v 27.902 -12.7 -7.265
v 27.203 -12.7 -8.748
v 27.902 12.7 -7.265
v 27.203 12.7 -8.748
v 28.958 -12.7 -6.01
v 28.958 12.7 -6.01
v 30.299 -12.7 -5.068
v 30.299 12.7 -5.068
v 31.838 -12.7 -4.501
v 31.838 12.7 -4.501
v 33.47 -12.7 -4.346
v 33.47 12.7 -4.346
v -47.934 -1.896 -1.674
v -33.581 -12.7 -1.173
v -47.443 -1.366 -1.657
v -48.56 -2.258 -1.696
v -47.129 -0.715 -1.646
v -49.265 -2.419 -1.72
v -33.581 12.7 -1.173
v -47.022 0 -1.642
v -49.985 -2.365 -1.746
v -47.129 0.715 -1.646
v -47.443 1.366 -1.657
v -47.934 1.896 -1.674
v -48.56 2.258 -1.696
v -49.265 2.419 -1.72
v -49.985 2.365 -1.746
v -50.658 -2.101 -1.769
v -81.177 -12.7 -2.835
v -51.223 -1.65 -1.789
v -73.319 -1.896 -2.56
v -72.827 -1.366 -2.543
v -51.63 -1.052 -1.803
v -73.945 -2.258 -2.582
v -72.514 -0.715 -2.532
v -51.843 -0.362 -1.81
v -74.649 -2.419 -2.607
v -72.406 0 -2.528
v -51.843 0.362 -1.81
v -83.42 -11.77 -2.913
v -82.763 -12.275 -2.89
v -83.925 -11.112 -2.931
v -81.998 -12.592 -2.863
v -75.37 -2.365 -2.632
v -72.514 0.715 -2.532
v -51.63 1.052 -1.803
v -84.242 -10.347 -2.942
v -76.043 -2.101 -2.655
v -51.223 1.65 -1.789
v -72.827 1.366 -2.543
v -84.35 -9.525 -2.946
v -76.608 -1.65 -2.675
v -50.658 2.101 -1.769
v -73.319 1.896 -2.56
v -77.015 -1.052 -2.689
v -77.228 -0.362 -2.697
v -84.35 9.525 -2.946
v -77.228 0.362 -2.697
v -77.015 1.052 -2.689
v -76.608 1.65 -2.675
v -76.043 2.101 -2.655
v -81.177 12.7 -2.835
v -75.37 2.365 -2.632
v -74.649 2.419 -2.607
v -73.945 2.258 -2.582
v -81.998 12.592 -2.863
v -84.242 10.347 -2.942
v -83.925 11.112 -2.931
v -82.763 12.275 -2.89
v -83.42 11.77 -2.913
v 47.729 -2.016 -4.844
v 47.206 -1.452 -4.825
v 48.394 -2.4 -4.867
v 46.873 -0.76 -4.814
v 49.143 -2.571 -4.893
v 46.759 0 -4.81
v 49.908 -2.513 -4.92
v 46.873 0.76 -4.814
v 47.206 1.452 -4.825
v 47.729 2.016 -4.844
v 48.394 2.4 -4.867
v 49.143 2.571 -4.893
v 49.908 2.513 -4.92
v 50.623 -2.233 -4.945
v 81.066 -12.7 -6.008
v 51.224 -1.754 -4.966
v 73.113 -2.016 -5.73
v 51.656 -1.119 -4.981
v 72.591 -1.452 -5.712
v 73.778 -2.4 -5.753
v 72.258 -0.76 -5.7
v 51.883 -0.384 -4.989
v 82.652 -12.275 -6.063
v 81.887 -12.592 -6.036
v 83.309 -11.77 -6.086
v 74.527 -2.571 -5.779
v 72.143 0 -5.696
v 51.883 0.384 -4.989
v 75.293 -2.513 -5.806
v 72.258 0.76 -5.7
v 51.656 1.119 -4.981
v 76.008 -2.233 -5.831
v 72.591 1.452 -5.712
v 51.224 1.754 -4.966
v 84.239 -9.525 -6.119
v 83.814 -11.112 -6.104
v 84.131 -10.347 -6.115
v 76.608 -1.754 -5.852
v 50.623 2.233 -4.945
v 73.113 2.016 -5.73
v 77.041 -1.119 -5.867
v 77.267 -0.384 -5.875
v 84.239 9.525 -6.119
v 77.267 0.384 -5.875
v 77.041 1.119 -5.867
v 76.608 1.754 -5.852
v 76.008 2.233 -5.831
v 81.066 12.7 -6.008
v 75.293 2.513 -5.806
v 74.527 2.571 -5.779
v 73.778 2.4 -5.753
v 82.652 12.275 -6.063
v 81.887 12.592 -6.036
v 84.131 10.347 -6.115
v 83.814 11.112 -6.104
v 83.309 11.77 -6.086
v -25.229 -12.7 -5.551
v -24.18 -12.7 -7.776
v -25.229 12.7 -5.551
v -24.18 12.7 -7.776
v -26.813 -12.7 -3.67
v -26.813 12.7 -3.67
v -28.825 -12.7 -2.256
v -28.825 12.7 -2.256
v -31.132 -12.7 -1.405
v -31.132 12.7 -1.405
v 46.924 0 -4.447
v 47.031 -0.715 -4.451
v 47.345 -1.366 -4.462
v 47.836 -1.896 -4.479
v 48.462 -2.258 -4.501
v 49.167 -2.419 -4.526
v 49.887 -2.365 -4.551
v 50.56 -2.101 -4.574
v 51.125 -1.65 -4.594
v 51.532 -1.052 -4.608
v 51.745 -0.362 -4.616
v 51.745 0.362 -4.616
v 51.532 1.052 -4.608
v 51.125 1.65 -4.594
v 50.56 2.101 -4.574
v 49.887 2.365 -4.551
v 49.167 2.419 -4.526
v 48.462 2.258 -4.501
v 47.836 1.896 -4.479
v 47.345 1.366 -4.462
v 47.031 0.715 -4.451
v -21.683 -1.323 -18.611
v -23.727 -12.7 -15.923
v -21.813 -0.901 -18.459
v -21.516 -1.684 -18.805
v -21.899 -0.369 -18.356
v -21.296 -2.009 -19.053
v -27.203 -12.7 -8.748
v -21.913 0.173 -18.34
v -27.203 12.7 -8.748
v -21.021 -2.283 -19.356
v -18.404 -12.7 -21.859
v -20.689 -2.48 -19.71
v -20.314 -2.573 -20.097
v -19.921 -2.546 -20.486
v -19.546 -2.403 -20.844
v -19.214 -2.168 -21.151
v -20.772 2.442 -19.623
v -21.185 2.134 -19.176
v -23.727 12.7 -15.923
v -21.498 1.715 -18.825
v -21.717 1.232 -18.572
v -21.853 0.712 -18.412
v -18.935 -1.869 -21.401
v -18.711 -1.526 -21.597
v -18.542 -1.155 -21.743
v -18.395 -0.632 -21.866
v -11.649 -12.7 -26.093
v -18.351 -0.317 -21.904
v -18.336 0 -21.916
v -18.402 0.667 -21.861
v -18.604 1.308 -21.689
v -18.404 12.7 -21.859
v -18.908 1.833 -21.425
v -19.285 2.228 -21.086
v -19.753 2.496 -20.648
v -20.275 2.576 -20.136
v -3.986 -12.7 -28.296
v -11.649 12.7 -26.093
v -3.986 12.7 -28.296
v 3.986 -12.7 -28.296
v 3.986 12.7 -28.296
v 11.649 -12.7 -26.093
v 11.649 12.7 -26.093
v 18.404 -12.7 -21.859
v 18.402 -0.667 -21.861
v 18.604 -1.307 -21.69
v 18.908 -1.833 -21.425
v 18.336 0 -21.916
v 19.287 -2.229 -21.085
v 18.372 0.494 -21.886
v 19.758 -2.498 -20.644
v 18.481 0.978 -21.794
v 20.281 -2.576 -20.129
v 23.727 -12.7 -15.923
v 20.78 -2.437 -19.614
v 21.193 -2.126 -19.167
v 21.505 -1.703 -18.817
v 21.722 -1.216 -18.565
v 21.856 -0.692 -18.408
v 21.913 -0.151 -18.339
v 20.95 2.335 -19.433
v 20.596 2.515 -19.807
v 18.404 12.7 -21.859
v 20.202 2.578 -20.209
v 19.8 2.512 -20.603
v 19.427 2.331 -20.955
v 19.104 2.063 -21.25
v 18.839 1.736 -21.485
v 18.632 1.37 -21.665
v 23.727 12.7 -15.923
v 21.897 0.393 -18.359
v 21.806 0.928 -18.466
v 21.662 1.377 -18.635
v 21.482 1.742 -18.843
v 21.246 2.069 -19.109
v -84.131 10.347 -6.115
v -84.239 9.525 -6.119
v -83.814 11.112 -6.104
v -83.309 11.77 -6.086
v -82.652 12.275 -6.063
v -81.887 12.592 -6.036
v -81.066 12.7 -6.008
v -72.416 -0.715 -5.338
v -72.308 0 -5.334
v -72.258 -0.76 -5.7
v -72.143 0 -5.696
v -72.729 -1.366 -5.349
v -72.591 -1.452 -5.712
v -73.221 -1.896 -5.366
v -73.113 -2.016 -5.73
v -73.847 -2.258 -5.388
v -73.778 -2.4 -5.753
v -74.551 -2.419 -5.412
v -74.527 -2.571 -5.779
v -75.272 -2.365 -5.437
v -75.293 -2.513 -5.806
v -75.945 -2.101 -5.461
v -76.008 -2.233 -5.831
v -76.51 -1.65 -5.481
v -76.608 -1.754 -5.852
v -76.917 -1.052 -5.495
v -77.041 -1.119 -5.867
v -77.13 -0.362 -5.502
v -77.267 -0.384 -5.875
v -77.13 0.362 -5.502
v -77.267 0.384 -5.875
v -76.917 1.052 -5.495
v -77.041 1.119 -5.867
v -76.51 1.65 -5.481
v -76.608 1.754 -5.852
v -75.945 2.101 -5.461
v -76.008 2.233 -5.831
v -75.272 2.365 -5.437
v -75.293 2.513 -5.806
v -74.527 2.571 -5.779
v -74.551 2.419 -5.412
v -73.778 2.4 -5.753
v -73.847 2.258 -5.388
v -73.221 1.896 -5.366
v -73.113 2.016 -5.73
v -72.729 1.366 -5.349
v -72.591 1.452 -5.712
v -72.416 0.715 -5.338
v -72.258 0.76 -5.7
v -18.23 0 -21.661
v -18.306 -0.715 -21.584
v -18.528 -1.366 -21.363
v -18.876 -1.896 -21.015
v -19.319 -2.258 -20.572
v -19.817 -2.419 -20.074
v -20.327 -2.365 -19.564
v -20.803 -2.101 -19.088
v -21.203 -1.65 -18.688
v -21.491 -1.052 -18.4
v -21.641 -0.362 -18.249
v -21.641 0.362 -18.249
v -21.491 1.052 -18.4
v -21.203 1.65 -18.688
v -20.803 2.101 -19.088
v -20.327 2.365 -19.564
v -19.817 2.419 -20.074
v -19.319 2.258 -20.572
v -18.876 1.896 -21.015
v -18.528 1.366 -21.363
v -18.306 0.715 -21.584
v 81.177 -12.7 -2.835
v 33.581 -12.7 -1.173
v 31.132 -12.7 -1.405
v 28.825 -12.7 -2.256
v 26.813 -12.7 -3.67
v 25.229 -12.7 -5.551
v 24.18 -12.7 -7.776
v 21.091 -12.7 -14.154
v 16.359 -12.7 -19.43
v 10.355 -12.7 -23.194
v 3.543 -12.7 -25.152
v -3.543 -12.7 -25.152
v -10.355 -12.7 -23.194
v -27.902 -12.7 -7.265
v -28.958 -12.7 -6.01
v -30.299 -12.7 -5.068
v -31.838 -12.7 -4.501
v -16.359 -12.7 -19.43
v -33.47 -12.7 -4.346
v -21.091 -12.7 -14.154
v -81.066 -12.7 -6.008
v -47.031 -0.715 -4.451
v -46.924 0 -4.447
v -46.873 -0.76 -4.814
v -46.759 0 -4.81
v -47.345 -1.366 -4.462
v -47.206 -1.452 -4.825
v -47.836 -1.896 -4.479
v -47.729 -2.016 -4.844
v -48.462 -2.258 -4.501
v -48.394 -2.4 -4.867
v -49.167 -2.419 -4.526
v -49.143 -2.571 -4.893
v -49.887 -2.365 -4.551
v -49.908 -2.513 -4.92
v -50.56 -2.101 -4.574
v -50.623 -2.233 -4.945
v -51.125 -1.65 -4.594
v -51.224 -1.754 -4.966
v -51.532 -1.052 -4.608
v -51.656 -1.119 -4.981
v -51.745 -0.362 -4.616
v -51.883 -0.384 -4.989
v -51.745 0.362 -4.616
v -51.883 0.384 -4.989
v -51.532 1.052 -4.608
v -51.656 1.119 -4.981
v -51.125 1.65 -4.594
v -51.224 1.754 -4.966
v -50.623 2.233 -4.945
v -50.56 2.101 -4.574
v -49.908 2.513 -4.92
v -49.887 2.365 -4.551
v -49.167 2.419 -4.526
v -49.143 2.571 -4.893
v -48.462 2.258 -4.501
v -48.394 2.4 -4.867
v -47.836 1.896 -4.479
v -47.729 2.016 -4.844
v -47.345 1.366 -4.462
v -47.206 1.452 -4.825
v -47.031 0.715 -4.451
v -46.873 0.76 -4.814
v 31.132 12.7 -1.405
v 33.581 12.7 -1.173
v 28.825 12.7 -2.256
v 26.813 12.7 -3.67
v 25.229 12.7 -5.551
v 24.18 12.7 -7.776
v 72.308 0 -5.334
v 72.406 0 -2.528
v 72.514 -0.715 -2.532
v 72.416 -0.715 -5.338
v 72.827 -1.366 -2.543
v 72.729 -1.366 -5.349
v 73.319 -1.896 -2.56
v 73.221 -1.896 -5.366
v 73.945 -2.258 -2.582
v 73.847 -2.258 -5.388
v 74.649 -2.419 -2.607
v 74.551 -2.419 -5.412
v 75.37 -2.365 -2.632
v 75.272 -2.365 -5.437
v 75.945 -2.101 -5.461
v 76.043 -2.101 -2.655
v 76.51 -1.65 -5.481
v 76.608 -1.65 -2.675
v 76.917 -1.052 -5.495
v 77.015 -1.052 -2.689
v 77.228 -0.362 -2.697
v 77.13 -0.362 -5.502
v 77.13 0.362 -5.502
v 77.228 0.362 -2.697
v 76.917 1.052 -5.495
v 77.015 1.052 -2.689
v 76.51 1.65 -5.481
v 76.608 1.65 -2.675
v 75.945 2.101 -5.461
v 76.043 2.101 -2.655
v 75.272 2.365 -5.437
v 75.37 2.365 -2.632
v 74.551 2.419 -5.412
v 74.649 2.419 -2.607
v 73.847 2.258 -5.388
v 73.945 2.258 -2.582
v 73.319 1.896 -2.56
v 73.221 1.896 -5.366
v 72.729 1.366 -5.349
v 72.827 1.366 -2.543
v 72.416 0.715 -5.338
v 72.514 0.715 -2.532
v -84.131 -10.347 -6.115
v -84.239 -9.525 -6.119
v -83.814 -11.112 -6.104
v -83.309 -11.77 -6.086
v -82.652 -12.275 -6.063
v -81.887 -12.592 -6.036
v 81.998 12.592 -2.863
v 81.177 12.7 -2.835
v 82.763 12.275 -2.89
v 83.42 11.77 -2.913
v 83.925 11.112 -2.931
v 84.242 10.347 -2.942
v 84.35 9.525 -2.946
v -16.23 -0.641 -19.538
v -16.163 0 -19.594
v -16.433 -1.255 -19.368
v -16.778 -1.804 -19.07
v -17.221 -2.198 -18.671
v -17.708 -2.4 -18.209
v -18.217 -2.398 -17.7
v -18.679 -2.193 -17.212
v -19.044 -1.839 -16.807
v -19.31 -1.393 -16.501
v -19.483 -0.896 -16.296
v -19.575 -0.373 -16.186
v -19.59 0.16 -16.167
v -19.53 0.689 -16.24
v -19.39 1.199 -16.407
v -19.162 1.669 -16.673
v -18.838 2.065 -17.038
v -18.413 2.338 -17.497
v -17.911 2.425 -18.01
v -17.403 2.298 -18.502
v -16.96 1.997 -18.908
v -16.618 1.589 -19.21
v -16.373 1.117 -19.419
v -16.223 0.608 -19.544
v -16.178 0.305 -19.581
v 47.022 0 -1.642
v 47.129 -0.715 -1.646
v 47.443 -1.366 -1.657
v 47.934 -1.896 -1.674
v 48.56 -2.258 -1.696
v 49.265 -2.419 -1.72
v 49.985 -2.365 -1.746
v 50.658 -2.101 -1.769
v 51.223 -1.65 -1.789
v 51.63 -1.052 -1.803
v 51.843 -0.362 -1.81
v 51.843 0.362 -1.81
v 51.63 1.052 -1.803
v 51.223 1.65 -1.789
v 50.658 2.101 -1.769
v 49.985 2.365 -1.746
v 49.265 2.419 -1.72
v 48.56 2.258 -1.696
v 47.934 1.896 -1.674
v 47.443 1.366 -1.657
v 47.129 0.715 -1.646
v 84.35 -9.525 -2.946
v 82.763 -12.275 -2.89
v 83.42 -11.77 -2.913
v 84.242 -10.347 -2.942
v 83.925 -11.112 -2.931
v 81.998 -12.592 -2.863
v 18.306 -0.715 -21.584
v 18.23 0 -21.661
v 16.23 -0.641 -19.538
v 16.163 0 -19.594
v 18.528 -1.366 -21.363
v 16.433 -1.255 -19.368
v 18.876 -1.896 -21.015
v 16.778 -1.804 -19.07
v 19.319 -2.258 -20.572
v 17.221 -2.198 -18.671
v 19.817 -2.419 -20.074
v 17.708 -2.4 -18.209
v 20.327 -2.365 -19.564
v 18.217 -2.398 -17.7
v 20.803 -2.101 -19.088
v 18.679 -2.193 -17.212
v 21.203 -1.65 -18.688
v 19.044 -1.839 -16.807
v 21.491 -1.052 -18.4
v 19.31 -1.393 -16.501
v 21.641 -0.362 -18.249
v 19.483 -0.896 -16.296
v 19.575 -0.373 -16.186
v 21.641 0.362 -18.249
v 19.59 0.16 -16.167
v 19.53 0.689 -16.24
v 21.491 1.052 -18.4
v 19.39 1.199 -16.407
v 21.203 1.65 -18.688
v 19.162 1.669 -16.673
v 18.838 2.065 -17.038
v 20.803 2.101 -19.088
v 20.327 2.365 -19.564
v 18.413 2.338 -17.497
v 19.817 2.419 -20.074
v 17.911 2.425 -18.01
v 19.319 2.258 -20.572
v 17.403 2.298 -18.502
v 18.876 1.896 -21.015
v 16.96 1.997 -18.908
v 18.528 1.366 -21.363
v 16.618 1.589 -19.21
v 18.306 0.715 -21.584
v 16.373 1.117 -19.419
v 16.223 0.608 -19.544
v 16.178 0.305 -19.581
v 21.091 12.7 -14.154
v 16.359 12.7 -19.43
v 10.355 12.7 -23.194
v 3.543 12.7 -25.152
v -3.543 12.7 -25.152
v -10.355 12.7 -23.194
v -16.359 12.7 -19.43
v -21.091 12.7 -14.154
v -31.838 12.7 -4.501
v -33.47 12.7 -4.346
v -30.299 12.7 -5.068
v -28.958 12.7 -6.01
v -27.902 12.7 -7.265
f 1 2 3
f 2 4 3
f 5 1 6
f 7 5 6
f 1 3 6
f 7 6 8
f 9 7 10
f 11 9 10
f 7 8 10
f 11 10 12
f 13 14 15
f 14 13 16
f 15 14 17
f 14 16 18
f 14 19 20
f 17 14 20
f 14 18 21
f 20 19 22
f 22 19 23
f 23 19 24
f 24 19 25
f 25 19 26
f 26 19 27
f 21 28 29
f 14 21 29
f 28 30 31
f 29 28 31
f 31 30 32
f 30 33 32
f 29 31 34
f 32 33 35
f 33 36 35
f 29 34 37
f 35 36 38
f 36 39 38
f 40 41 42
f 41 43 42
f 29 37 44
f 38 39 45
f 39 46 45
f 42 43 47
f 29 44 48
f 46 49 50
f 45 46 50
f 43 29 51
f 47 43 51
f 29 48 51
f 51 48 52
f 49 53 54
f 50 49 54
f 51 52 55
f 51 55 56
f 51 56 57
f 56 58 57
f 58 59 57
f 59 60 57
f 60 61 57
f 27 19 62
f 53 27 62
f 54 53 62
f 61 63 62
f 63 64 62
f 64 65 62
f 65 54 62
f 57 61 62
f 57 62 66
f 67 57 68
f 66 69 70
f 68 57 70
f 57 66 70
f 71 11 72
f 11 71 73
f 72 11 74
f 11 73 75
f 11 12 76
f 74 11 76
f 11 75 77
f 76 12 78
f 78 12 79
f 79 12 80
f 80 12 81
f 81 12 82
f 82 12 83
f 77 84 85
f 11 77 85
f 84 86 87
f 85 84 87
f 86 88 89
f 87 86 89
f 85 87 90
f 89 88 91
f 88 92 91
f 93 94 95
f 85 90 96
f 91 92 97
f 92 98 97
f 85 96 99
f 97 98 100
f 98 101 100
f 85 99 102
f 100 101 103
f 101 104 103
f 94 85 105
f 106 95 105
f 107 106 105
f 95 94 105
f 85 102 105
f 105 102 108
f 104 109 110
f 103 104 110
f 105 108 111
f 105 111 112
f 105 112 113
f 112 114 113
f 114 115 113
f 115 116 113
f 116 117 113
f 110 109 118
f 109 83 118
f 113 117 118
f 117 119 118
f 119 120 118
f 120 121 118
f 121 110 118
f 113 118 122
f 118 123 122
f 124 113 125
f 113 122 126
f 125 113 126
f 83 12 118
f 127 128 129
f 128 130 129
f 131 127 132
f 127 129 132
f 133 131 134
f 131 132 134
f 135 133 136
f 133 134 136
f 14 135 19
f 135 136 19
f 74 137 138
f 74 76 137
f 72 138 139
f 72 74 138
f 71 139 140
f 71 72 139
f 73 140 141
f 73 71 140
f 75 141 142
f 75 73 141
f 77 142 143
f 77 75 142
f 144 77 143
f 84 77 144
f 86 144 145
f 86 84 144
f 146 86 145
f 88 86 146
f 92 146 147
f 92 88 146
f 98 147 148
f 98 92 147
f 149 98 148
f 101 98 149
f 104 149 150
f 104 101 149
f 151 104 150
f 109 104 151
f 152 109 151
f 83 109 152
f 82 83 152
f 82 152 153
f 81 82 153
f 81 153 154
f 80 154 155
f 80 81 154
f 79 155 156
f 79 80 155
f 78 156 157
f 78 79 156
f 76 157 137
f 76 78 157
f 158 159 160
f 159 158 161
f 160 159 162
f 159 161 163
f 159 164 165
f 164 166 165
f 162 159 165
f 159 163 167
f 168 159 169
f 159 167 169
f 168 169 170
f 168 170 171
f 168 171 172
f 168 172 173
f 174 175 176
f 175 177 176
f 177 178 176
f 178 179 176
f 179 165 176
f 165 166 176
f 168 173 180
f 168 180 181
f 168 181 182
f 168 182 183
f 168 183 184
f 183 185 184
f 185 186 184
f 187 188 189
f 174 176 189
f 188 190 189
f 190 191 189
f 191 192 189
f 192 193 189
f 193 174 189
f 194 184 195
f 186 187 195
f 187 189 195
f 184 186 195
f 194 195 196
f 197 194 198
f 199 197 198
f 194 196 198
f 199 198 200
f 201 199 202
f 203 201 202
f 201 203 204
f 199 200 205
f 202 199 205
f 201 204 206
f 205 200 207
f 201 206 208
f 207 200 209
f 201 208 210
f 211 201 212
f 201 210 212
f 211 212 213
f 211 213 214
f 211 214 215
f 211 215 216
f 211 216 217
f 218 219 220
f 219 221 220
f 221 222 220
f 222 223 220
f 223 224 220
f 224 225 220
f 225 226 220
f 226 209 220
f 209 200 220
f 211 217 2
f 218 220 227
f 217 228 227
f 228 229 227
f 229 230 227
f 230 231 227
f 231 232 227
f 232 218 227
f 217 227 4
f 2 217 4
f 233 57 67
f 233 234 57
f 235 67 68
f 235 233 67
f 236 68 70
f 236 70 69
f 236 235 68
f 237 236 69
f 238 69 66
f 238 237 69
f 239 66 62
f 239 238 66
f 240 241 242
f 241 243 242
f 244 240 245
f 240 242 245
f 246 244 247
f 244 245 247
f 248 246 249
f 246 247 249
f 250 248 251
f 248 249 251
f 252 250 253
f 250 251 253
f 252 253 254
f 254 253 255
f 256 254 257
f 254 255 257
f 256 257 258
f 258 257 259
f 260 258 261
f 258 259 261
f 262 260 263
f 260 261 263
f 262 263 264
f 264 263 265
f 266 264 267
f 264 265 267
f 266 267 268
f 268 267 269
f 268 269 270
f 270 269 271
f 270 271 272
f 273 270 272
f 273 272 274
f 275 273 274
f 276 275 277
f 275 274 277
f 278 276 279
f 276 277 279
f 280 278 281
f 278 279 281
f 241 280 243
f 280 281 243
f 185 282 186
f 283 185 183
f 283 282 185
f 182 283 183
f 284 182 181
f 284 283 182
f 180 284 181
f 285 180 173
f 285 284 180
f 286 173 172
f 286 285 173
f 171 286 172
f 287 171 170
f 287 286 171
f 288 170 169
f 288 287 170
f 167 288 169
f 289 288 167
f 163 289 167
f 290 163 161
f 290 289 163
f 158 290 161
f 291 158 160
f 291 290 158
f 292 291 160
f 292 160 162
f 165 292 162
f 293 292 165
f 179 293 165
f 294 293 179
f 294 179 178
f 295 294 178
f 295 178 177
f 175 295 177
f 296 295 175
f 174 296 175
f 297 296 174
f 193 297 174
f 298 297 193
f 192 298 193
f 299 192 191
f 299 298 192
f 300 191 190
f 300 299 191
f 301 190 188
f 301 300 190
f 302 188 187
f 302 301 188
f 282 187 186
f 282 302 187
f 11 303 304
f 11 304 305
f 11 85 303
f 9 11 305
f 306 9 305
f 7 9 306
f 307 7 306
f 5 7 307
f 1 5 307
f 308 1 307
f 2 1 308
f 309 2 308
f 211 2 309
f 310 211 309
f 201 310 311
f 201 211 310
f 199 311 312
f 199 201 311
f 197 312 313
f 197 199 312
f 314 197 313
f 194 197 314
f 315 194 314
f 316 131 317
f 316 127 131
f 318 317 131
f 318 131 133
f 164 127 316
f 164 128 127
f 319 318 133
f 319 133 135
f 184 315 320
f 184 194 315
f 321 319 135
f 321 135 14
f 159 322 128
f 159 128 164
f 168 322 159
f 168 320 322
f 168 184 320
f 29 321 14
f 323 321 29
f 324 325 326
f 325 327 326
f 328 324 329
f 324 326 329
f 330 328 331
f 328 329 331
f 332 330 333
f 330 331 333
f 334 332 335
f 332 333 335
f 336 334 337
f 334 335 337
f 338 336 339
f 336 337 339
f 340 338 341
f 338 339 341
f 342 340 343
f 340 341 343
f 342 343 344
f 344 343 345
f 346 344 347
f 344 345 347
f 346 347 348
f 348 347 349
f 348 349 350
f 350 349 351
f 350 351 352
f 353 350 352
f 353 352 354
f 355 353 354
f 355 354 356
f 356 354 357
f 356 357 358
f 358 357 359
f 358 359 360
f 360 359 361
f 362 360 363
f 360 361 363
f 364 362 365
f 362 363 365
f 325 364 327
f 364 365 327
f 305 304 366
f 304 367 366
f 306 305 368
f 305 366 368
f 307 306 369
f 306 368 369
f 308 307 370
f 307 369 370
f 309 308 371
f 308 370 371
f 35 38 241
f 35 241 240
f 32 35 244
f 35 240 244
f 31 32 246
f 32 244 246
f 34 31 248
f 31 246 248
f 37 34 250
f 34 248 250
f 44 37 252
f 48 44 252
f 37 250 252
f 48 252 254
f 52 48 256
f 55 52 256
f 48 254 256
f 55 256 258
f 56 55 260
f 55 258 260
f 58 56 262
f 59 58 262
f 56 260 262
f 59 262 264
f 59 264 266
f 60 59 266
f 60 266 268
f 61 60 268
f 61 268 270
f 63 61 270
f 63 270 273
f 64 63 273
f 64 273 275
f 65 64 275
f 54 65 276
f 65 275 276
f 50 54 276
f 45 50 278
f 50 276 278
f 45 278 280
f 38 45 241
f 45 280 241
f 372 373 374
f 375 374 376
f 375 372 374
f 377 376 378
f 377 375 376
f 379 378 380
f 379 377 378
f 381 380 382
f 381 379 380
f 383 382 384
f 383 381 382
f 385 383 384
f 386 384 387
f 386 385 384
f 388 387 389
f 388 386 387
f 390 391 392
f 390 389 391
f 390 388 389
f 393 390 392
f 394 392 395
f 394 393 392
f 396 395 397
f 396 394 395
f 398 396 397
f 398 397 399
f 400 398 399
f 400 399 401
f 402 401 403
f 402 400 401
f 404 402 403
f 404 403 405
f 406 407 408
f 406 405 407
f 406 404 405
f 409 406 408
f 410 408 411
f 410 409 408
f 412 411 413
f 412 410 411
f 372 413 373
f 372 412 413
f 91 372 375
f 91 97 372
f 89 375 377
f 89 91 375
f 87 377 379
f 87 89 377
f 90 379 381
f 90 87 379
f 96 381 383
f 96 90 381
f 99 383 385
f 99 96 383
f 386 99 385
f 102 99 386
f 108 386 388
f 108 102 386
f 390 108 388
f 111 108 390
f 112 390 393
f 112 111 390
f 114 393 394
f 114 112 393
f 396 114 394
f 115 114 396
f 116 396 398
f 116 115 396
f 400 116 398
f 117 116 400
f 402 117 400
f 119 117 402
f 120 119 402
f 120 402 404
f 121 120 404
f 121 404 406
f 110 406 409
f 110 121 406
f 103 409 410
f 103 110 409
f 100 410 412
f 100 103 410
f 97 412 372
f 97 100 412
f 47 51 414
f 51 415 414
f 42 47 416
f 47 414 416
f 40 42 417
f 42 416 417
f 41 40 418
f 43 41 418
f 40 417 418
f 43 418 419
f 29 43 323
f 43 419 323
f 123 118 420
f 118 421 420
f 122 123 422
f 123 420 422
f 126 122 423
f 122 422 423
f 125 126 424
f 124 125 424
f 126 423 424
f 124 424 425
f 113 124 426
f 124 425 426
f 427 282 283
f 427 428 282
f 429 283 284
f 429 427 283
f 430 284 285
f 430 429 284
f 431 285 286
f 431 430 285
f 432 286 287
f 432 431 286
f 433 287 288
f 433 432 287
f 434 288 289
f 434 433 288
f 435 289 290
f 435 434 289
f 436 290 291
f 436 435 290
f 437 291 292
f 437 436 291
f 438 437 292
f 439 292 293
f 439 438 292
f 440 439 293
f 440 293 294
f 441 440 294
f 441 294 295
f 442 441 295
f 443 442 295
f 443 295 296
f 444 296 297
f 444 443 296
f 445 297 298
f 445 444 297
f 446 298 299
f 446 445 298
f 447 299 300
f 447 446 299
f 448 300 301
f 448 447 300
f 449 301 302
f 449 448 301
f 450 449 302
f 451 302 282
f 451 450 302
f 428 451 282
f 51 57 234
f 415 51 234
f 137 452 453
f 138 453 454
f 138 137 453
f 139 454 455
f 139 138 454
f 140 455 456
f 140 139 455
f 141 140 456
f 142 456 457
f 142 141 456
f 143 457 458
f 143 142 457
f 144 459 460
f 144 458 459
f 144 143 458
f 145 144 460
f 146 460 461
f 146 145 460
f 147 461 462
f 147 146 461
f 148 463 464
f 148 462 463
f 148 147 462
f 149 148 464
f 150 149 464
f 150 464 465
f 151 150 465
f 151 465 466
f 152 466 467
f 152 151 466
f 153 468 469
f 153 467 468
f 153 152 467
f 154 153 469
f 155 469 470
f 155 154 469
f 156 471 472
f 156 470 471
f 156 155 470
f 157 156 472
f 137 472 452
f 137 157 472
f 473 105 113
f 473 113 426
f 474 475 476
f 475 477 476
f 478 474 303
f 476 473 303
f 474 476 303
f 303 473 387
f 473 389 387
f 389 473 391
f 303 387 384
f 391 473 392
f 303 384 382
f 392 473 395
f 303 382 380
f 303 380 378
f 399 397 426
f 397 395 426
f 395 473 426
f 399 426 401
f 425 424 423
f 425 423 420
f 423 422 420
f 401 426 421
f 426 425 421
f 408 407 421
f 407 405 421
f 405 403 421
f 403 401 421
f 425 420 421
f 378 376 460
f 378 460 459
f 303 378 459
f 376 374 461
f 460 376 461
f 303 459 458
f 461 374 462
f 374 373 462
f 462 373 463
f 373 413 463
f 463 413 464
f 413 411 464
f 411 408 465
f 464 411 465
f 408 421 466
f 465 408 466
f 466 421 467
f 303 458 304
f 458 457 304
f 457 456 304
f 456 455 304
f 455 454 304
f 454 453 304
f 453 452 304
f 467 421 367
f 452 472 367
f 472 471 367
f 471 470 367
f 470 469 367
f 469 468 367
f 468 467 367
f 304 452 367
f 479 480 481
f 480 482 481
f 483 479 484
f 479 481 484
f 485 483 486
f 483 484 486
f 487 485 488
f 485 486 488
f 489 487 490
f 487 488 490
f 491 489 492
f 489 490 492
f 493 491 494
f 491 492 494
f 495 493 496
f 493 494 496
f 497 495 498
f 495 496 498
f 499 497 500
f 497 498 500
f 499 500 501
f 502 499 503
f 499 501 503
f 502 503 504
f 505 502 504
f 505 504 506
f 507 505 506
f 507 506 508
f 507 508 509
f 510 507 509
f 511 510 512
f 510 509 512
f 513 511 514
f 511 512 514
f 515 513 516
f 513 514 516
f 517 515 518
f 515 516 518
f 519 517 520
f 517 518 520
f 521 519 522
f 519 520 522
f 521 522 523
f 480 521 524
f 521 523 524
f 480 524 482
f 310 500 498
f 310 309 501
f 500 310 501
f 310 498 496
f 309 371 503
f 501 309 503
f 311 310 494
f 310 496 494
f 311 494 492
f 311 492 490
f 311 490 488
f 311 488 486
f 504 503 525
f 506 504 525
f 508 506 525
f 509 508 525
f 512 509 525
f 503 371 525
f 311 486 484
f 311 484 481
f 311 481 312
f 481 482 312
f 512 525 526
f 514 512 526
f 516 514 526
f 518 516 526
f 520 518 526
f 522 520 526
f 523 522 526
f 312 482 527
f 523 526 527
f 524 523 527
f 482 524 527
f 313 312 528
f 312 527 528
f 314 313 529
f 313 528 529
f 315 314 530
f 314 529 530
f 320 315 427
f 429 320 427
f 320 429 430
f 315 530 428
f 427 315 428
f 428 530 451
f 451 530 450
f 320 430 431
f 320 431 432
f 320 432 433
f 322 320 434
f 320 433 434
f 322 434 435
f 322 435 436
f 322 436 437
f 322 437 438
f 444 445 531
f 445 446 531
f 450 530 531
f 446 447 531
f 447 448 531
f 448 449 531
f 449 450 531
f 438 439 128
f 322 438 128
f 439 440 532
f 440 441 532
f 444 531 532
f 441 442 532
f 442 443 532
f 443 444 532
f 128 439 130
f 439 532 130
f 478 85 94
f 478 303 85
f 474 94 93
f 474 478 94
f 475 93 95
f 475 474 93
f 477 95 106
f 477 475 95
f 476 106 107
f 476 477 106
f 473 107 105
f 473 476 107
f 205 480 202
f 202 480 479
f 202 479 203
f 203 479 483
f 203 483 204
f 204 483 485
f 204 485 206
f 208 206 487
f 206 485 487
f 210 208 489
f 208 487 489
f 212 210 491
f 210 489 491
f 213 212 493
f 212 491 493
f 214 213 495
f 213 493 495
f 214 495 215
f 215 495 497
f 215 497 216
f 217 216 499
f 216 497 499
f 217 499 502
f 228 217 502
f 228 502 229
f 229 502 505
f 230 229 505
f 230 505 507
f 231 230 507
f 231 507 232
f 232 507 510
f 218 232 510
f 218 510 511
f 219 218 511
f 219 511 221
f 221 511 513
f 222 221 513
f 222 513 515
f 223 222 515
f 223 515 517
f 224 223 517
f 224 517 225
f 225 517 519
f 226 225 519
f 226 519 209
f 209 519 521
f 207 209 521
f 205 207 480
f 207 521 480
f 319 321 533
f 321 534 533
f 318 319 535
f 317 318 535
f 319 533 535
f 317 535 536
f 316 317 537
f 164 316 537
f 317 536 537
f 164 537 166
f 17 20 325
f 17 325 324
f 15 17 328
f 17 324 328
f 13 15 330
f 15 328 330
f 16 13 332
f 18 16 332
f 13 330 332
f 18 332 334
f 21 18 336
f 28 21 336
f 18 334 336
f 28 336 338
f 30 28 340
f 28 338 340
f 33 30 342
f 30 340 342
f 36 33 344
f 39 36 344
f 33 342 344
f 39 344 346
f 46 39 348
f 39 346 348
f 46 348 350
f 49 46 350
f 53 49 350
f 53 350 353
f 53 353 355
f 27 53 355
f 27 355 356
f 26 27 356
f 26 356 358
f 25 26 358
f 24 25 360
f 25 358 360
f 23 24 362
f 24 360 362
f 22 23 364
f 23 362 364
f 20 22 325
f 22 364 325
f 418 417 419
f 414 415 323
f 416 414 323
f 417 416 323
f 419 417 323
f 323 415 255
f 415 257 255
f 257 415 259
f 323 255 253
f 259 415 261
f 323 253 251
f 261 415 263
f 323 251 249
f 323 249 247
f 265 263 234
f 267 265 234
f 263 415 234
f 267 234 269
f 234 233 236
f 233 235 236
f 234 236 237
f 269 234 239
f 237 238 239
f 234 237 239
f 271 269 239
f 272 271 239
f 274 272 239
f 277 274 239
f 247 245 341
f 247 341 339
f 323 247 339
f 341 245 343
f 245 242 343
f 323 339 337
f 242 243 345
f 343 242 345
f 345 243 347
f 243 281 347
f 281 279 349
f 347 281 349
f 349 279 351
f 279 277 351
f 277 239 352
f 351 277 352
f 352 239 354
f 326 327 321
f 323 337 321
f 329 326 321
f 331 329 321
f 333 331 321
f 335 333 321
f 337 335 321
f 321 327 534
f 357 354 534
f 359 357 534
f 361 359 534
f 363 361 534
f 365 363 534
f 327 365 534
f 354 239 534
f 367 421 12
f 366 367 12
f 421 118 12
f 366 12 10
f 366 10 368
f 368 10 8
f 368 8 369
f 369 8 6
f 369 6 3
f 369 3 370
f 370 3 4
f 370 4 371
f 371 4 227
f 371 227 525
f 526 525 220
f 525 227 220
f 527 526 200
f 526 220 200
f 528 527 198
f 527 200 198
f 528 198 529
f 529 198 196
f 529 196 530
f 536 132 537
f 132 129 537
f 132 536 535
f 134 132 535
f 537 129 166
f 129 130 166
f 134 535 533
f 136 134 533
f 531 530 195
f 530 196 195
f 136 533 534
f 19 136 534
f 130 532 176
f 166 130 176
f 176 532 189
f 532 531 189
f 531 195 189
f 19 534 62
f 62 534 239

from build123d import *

# Parameters (mm, degrees)
BASE_FLANGE1_DEPTH                    = 12.7
F_11_0_191_DIAMETER_HOLE2_AT_2_COUNT  = 2
F_11_0_191_DIAMETER_HOLE2_AT_2_PITCH  = 25.4
F_11_0_191_DIAMETER_HOLE3_D           = 4.8514
F_11_0_191_DIAMETER_HOLE3_DEPTH       = 40.176204246
F_11_0_191_DIAMETER_HOLE3_CSINK_D     = 5.1562
F_11_0_191_DIAMETER_HOLE3_CSINK_ANGLE = 45
FILLET2_R                             = 3.175


# Sheet-metal steps are written as plain solids
with BuildPart() as part:
    # Sketch1 → Base-Flange1 (new, symmetric)
    with BuildSketch(Plane(origin=(0, 0, 0), x_dir=(1, 0, 0), z_dir=(0, 1, 0))):
        with BuildLine():
            Line((84.349626816, 2.945553875), (33.580572804, 1.172659442))
            ThreePointArc((33.580572804, 1.172659442), (27.77304054, 2.897708907), (24.180476435, 7.775896051))
            ThreePointArc((24.180476435, 7.775896051), (0, 25.4), (-24.180476435, 7.775896051))
            ThreePointArc((-24.180476435, 7.775896051), (-27.77304054, 2.897708907), (-33.580572804, 1.172659442))
            Line((-33.580572804, 1.172659442), (-84.349626816, 2.945553875))
            Line((-84.349626816, 2.945553875), (-84.238820914, 6.118619751))
            Line((-84.238820914, 6.118619751), (-33.469766902, 4.345725318))
            ThreePointArc((-33.469766902, 4.345725318), (-29.598078726, 5.495758295), (-27.203035989, 8.747883057))
            ThreePointArc((-27.203035989, 8.747883057), (0, 28.575), (27.203035989, 8.747883057))
            ThreePointArc((27.203035989, 8.747883057), (29.598078726, 5.495758295), (33.469766902, 4.345725318))
            Line((33.469766902, 4.345725318), (84.238820914, 6.118619751))
            Line((84.238820914, 6.118619751), (84.349626816, 2.945553875))
        make_face()
    extrude(amount=BASE_FLANGE1_DEPTH, both=True)

    # Sketch8 → #11 (0.191) Diameter Hole2 (revolve, cut)
    with BuildSketch(Plane(origin=(74.719623287, 0, -5.786202044), x_dir=(-0.9993908270190958, 0, 0.03489949670250169), z_dir=(0, 1, 0))):
        Polygon((0, 0), (0, 4.947848723), (2.4257, 4.947848723), (2.4257, 0.367926147), (2.5781, 0), align=None)
    f_11_0_191_diameter_hole2 = revolve(axis=Axis((74.498011483, 0, -12.132333796), (0.03489949670250171, 0, 0.9993908270190958)), mode=Mode.SUBTRACT)

    # #11 (0.191) Diameter Hole2 at 2: #11 (0.191) Diameter Hole2 ×2
    with Locations(*[Vector(-0.9993908270190958, 0, 0.034899496702501684) * (i * F_11_0_191_DIAMETER_HOLE2_AT_2_PITCH) for i in range(1, F_11_0_191_DIAMETER_HOLE2_AT_2_COUNT)]):
        add(f_11_0_191_diameter_hole2, mode=Mode.SUBTRACT)

    # #11 (0.191) Diameter Hole3
    with Locations(Plane(origin=(20.205576272, 0, -20.205576272), x_dir=(0.707106781187, 0, 0.707106781187), z_dir=(0.707106781187, 0, -0.707106781187))):
        with Locations((0, 0)):
            f_11_0_191_diameter_hole3 = CounterSinkHole(F_11_0_191_DIAMETER_HOLE3_D / 2, F_11_0_191_DIAMETER_HOLE3_CSINK_D / 2, depth=F_11_0_191_DIAMETER_HOLE3_DEPTH, counter_sink_angle=F_11_0_191_DIAMETER_HOLE3_CSINK_ANGLE)

    # Fillet2
    fillet2_edges = [part.edges().sort_by_distance(p)[0] for p in [
        (84.294223865, 12.7, -4.532086813),
        (-84.294223865, -12.7, -4.532086813),
        (84.294223865, -12.7, -4.532086813),
        (-84.294223865, 12.7, -4.532086813),
    ]]
    fillet(fillet2_edges, radius=FILLET2_R)

    # Mirror1: #11 (0.191) Diameter Hole2, #11 (0.191) Diameter Hole3 across plane
    add(f_11_0_191_diameter_hole2.mirror(Plane(origin=(0, 0, 0), x_dir=(0, 0, 1), z_dir=(1, 0, 0))), mode=Mode.SUBTRACT)
    add(f_11_0_191_diameter_hole3.mirror(Plane(origin=(0, 0, 0), x_dir=(0, 0, 1), z_dir=(1, 0, 0))), mode=Mode.SUBTRACT)

    # Mirror1 copy 1 sketch → Mirror1 copy 1 (revolve, cut)
    with BuildSketch(Plane(origin=(-49.335096281, 0, -4.899754828), x_dir=(0.9993908270190958, 0, 0.03489949670250169), z_dir=(0, 1, 0))):
        Polygon((0, 0), (0, -4.947848723), (2.4257, -4.947848723), (2.4257, -0.367926147), (2.5781, 0), align=None)
    revolve(axis=Axis((-49.113484477, 0, -11.24588658), (0.03489949670250171, 0, -0.9993908270190958)), mode=Mode.SUBTRACT)


solid = part.part
